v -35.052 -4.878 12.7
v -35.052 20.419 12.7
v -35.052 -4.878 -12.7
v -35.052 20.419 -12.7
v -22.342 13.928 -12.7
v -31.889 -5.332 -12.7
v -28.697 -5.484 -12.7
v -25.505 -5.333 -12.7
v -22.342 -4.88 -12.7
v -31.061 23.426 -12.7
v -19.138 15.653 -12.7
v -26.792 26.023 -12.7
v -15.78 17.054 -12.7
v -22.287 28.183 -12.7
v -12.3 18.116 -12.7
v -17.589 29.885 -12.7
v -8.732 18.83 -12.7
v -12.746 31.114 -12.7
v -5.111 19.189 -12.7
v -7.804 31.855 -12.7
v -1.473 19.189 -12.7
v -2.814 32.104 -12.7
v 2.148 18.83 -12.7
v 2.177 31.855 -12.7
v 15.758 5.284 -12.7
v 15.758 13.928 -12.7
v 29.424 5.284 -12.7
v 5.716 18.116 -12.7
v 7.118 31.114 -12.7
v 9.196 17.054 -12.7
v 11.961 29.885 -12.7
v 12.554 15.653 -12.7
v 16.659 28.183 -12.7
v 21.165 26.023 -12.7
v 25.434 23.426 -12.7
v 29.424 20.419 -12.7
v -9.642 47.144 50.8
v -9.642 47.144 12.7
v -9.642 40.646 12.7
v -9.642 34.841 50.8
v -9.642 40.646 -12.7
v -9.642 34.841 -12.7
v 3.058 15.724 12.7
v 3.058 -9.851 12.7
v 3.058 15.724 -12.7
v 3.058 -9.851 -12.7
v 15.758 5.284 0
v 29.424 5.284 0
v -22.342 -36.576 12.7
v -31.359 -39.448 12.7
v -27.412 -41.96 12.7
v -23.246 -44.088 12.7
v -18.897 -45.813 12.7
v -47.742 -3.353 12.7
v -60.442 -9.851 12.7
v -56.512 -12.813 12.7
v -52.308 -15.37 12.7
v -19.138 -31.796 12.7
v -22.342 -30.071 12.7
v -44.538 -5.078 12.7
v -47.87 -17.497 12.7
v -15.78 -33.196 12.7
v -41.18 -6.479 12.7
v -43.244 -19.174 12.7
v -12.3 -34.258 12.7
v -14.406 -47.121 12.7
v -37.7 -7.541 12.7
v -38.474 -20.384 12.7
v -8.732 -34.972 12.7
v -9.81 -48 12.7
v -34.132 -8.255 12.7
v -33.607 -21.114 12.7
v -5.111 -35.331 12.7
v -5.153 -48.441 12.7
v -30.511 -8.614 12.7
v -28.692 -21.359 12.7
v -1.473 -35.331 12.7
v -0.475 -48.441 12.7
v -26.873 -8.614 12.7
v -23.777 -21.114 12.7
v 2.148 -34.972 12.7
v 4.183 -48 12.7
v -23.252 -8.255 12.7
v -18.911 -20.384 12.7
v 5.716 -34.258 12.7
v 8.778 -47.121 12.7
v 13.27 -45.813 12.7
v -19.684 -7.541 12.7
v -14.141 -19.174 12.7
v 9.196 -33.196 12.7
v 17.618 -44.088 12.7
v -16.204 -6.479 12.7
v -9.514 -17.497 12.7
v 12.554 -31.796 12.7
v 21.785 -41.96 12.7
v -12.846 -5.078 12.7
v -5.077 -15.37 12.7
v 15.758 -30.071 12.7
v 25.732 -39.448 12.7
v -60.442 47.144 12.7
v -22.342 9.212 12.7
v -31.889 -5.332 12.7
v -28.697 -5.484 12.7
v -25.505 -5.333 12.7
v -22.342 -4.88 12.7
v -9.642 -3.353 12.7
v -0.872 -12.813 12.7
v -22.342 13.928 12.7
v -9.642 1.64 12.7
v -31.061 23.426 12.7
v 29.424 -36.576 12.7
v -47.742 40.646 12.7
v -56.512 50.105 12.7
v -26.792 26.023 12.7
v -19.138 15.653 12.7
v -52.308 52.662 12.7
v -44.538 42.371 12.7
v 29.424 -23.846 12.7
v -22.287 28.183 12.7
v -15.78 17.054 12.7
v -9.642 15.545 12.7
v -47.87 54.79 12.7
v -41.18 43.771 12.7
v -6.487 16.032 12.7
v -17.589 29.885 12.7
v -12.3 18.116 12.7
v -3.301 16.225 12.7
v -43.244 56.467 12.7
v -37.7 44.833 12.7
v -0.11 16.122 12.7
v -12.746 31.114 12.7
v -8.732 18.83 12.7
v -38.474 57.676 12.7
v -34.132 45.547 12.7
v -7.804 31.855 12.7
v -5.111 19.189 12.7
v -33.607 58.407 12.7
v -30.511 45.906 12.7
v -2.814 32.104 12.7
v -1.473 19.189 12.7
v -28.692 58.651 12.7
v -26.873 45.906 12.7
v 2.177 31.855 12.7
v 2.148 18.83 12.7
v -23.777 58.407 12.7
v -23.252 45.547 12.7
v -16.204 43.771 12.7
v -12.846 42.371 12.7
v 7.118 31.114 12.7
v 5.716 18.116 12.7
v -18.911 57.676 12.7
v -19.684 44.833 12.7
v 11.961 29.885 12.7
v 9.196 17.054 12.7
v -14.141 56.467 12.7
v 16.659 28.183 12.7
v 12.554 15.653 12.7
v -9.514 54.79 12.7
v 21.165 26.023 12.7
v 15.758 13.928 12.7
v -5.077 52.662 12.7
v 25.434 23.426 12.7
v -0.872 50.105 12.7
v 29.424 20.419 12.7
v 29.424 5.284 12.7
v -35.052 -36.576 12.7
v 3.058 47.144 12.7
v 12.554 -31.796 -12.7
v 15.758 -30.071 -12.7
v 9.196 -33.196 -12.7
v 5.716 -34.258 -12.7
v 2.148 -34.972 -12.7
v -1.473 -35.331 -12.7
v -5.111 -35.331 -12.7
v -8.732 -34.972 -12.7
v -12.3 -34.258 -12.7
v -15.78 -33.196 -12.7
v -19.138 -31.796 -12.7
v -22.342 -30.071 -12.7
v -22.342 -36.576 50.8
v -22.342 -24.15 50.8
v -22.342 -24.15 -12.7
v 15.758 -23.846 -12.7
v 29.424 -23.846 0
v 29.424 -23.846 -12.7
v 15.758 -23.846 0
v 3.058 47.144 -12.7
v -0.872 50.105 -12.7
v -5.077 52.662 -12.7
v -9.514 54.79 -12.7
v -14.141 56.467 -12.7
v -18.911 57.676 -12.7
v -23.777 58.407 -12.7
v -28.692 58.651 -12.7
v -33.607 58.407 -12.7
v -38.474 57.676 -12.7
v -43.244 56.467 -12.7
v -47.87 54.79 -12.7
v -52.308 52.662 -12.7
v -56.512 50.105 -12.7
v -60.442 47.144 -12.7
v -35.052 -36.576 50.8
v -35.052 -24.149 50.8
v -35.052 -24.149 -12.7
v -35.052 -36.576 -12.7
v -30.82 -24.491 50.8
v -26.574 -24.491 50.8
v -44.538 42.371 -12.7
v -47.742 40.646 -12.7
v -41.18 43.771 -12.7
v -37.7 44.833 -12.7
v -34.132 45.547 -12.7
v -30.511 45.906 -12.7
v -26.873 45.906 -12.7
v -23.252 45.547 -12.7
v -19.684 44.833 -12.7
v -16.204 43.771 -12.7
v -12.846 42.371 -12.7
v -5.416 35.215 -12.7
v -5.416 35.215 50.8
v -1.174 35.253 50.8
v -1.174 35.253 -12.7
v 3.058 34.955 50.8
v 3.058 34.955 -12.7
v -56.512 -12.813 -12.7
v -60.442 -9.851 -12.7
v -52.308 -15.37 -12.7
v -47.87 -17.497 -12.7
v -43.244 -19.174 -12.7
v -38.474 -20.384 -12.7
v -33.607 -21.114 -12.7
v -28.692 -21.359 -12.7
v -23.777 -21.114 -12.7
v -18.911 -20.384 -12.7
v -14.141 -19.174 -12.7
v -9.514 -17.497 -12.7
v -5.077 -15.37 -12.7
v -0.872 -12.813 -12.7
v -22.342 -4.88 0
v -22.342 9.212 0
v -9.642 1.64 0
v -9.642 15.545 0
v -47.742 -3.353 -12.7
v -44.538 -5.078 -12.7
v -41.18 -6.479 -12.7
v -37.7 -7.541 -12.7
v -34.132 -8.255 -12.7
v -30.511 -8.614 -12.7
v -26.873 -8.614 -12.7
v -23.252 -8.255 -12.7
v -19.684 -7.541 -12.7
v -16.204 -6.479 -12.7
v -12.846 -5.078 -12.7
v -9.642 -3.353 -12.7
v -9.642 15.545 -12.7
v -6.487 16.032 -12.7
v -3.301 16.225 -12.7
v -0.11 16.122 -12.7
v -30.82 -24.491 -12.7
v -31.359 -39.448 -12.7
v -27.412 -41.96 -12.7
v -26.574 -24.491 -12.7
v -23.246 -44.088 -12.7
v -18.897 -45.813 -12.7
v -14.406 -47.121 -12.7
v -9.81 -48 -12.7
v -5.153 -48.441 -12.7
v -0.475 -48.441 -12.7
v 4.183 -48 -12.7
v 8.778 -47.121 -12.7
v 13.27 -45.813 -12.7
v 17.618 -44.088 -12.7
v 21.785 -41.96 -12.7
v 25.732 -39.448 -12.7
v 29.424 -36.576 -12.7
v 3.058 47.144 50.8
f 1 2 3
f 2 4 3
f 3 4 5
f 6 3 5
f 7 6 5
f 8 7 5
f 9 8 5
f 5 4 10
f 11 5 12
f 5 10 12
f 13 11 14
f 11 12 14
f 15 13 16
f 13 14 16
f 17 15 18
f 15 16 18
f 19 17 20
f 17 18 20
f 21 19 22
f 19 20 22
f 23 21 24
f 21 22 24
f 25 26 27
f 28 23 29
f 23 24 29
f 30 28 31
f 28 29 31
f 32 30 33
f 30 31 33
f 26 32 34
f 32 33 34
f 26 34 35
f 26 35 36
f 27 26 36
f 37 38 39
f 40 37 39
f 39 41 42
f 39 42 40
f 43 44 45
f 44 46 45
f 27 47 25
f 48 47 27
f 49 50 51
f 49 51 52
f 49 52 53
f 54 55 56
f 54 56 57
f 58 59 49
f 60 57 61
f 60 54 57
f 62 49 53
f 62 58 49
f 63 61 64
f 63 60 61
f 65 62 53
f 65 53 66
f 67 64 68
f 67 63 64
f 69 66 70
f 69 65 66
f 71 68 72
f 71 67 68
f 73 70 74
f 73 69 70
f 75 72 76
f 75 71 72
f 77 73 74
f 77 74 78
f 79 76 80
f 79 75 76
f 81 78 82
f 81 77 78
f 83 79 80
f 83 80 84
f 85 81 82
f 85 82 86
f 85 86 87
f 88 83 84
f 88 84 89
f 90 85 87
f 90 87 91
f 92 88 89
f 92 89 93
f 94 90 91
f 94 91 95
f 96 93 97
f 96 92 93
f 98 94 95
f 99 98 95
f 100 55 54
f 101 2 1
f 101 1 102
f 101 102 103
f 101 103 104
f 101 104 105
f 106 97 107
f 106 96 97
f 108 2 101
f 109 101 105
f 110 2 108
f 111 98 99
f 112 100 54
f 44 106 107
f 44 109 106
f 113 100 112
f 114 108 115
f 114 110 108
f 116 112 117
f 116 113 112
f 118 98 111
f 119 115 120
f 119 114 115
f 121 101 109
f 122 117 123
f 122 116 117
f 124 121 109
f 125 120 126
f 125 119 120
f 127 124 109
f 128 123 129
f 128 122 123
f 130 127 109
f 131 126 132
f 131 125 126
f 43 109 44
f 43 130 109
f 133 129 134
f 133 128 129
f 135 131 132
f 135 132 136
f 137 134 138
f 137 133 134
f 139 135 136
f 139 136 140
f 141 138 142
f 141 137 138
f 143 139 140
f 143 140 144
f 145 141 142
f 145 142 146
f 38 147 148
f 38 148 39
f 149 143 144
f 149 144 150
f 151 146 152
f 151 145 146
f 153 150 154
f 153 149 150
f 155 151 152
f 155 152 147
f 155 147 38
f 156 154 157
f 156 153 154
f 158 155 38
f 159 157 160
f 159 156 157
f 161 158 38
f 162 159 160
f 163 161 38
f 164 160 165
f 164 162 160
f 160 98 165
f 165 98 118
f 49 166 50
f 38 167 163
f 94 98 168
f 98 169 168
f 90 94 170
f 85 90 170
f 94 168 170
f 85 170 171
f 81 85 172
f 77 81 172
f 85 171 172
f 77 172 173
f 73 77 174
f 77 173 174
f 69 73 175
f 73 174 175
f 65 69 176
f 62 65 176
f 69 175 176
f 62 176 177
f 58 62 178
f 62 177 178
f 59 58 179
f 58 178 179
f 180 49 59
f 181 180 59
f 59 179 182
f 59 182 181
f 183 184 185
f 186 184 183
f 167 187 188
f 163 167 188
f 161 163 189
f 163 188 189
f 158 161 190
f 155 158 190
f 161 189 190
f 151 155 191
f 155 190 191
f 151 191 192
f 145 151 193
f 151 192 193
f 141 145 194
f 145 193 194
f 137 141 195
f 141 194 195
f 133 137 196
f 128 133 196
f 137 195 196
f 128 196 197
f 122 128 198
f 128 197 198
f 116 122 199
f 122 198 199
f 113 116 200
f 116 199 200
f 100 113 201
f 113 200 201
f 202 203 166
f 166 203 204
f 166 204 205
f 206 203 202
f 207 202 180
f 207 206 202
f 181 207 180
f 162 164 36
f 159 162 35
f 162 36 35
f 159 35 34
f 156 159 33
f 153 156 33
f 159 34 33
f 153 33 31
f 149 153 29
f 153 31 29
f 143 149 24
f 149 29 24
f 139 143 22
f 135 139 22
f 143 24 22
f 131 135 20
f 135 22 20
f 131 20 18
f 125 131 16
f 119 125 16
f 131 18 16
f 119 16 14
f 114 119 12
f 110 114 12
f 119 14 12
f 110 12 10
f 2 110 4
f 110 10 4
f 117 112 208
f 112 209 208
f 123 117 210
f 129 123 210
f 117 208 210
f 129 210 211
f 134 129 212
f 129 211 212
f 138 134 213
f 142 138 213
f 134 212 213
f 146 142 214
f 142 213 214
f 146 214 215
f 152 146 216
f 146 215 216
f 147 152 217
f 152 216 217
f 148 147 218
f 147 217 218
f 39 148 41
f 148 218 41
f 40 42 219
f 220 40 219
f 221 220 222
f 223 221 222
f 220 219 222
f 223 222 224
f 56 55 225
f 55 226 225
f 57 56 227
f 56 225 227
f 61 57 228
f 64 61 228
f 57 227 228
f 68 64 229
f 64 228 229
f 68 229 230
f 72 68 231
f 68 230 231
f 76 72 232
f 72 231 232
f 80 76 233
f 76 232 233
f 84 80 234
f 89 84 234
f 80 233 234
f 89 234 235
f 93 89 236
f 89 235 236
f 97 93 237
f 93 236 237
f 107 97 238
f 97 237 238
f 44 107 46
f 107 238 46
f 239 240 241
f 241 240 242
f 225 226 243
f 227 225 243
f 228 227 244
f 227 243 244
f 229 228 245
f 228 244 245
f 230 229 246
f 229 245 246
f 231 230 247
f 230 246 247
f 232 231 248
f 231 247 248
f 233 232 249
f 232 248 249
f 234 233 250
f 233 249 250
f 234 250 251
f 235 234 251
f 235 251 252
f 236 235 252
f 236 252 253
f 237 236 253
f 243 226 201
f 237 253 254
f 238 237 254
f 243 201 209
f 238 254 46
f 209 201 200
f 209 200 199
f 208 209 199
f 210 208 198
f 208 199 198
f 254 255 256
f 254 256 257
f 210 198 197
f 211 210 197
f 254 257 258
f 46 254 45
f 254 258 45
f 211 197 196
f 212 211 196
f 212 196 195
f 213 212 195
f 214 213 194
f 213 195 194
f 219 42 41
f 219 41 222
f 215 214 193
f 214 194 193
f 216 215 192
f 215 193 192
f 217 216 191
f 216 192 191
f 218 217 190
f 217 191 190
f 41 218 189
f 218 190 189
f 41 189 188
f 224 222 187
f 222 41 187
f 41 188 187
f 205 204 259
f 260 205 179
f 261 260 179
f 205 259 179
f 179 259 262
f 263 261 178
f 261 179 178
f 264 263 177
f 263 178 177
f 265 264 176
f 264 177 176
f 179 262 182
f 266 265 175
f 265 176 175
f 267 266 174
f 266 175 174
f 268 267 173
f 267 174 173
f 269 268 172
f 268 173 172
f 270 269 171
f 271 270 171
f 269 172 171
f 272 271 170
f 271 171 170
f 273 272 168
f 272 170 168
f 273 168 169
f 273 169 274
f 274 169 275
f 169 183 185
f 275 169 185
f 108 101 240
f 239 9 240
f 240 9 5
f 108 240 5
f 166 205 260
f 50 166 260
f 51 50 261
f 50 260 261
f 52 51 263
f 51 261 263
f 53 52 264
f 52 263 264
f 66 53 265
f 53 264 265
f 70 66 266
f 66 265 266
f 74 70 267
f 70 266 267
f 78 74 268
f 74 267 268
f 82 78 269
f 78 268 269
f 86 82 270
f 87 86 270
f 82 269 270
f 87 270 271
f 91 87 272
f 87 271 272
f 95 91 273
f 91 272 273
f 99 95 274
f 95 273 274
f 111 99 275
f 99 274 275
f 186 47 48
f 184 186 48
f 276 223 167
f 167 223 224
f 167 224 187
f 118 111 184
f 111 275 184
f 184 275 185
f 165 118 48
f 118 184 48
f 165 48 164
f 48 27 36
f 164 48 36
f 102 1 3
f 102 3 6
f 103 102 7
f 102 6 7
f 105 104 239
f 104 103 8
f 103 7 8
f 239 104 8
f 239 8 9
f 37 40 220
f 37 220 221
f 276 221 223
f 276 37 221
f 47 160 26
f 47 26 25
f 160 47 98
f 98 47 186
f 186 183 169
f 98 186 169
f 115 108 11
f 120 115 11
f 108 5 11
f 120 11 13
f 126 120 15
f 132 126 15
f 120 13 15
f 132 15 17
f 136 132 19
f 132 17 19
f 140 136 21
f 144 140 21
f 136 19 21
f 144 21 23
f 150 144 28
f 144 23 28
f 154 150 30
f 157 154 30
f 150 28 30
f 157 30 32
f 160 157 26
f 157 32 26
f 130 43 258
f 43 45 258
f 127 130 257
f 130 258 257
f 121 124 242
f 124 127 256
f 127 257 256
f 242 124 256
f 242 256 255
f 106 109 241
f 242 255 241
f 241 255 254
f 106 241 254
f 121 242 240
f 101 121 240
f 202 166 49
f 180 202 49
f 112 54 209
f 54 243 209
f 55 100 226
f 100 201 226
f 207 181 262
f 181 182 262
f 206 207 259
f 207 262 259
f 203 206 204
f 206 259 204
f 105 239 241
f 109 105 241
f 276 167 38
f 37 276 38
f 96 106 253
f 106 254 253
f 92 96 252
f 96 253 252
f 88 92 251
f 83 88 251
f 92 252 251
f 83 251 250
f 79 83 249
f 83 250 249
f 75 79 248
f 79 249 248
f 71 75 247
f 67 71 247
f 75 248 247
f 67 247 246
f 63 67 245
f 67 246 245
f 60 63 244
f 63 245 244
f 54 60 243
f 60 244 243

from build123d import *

# Parameters (mm, degrees)
F1_DEPTH = 12.7
F2_DEPTH = 50.8
F0_W     = 13.666504261
F0_H     = 29.129663293
F3_DEPTH = 12.7


with BuildPart() as f1:
    # F0 (on Top) → F1 (new body)
    with BuildSketch(Plane.XY):
        with BuildLine():
            ThreePointArc((3.0578177724, 47.1438282191), (-28.6921822276, 58.6511969227), (-60.4421822276, 47.1438282191))
            Line((-60.4421822276, 47.1438282191), (-60.4421822276, -9.8514343737))
            ThreePointArc((-60.4421822276, -9.8514343737), (-28.6921822276, -21.3588030773), (3.0578177724, -9.8514343737))
            Line((3.0578177724, -9.8514343737), (3.0578177724, 15.7243934782))
            ThreePointArc((3.0578177724, 15.7243934782), (-3.3005283958, 16.2251409604), (-9.6421822276, 15.5448904828))
            Line((-9.6421822276, 15.5448904828), (-9.6421822276, 1.6402346703))
            Line((-9.6421822276, 1.6402346703), (-9.6421822276, -3.3534845781))
            ThreePointArc((-9.6421822276, -3.3534845781), (-28.6921822276, -8.6588030681), (-47.7421822276, -3.3534845781))
            Line((-47.7421822276, -3.3534845781), (-47.7421822276, 40.6458784342))
            ThreePointArc((-47.7421822276, 40.6458784342), (-28.6921822276, 45.9511969227), (-9.6421822276, 40.6458784342))
            Line((-9.6421822276, 40.6458784342), (-9.6421822276, 47.1438282191))
            Line((-9.6421822276, 47.1438282191), (3.0578177724, 47.1438282191))
        make_face()
        with BuildLine():
            Line((3.0578177724, 34.9553501383), (3.0578177724, 47.1438282191))
            Line((3.0578177724, 47.1438282191), (-9.6421822276, 47.1438282191))
            Line((-9.6421822276, 47.1438282191), (-9.6421822276, 40.6458784342))
            Line((-9.6421822276, 40.6458784342), (-9.6421822276, 34.8409533928))
            ThreePointArc((-9.6421822276, 34.8409533928), (-3.2955894398, 35.2764107322), (3.0578177724, 34.9553501383))
        make_face()
    extrude(amount=-F1_DEPTH)

    # F0 (on Top) → F2 (join)
    with BuildSketch(Plane.XY):
        with BuildLine():
            Line((3.0578177724, 34.9553501383), (3.0578177724, 47.1438282191))
            Line((3.0578177724, 47.1438282191), (-9.6421822276, 47.1438282191))
            Line((-9.6421822276, 47.1438282191), (-9.6421822276, 40.6458784342))
            Line((-9.6421822276, 40.6458784342), (-9.6421822276, 34.8409533928))
            ThreePointArc((-9.6421822276, 34.8409533928), (-3.2955894398, 35.2764107322), (3.0578177724, 34.9553501383))
        make_face()
    extrude(amount=F2_DEPTH)



with BuildPart() as f1b:
    # F0 (on Top) → F1, piece 2 (new body)
    with BuildSketch(Plane.XY):
        with BuildLine():
            Line((-22.3420616333, -4.8797410205), (-22.3420616333, 9.2116537254))
            Line((-22.3420616333, 9.2116537254), (-22.3420616333, 13.9284846169))
            ThreePointArc((-22.3420616333, 13.9284846169), (-3.2920616333, 19.2338031054), (15.7579383667, 13.9284846169))
            Line((15.7579383667, 13.9284846169), (15.7579383667, 5.2839141095))
            Line((15.7579383667, 5.2839141095), (29.4244426276, 5.2839141095))
            Line((29.4244426276, 5.2839141095), (29.4244426276, 20.4192625928))
            ThreePointArc((29.4244426276, 20.4192625928), (-2.8137786862, 32.1035806717), (-35.052, 20.4192625928))
            Line((-35.052, 20.4192625928), (-35.052, -4.8778777905))
            ThreePointArc((-35.052, -4.8778777905), (-28.6971195064, -5.4838027062), (-22.3420616333, -4.8797410205))
        make_face()
    extrude(amount=-F1_DEPTH)


with BuildPart() as f1c:
    # F0 (on Top) → F1, piece 3 (new body)
    with BuildSketch(Plane.XY):
        with BuildLine():
            Line((29.4244426276, -23.8457491835), (15.7579383667, -23.8457491835))
            Line((15.7579383667, -23.8457491835), (15.7579383667, -30.0708783954))
            ThreePointArc((15.7579383667, -30.0708783954), (-3.2920616333, -35.3761968854), (-22.3420616333, -30.0708783954))
            Line((-22.3420616333, -30.0708783954), (-22.3420616333, -36.576))
            Line((-22.3420616333, -36.576), (-35.052, -36.576))
            ThreePointArc((-35.052, -36.576), (-2.8137786862, -48.4961576662), (29.4244426276, -36.576))
            Line((29.4244426276, -36.576), (29.4244426276, -23.8457491835))
        make_face()
        with BuildLine():
            Line((-22.3420616333, -36.576), (-22.3420616333, -30.0708783954))
            Line((-22.3420616333, -30.0708783954), (-22.3420616333, -24.150039099))
            ThreePointArc((-22.3420616333, -24.150039099), (-28.6970664182, -24.5338028511), (-35.052, -24.1488618101))
            Line((-35.052, -24.1488618101), (-35.052, -24.150039099))
            Line((-35.052, -24.150039099), (-35.052, -36.576))
            Line((-35.052, -36.576), (-22.3420616333, -36.576))
        make_face()
    extrude(amount=-F1_DEPTH)

    # F0 (on Top) → F2, piece 2 (join)
    with BuildSketch(Plane.XY):
        with BuildLine():
            Line((-22.3420616333, -36.576), (-22.3420616333, -30.0708783954))
            Line((-22.3420616333, -30.0708783954), (-22.3420616333, -24.150039099))
            ThreePointArc((-22.3420616333, -24.150039099), (-28.6970664182, -24.5338028511), (-35.052, -24.1488618101))
            Line((-35.052, -24.1488618101), (-35.052, -24.150039099))
            Line((-35.052, -24.150039099), (-35.052, -36.576))
            Line((-35.052, -36.576), (-22.3420616333, -36.576))
        make_face()
    extrude(amount=F2_DEPTH)


with BuildPart() as f1_1:
    add(f1.part)

    add(f1b.part)  # F3 merges F1b

    add(f1c.part)  # F3 merges F1c
    # F0 (on Top) → F3 (join)
    with BuildSketch(Plane.XY):
        with BuildLine():
            ThreePointArc((3.0578177724, 47.1438282191), (-28.6921822276, 58.6511969227), (-60.4421822276, 47.1438282191))
            Line((-60.4421822276, 47.1438282191), (-60.4421822276, -9.8514343737))
            ThreePointArc((-60.4421822276, -9.8514343737), (-28.6921822276, -21.3588030773), (3.0578177724, -9.8514343737))
            Line((3.0578177724, -9.8514343737), (3.0578177724, 15.7243934782))
            ThreePointArc((3.0578177724, 15.7243934782), (-3.3005283958, 16.2251409604), (-9.6421822276, 15.5448904828))
            Line((-9.6421822276, 15.5448904828), (-9.6421822276, 1.6402346703))
            Line((-9.6421822276, 1.6402346703), (-9.6421822276, -3.3534845781))
            ThreePointArc((-9.6421822276, -3.3534845781), (-28.6921822276, -8.6588030681), (-47.7421822276, -3.3534845781))
            Line((-47.7421822276, -3.3534845781), (-47.7421822276, 40.6458784342))
            ThreePointArc((-47.7421822276, 40.6458784342), (-28.6921822276, 45.9511969227), (-9.6421822276, 40.6458784342))
            Line((-9.6421822276, 40.6458784342), (-9.6421822276, 47.1438282191))
            Line((-9.6421822276, 47.1438282191), (3.0578177724, 47.1438282191))
        make_face()
        with BuildLine():
            Line((-22.3420616333, -4.8797410205), (-22.3420616333, 9.2116537254))
            Line((-22.3420616333, 9.2116537254), (-22.3420616333, 13.9284846169))
            ThreePointArc((-22.3420616333, 13.9284846169), (-3.2920616333, 19.2338031054), (15.7579383667, 13.9284846169))
            Line((15.7579383667, 13.9284846169), (15.7579383667, 5.2839141095))
            Line((15.7579383667, 5.2839141095), (29.4244426276, 5.2839141095))
            Line((29.4244426276, 5.2839141095), (29.4244426276, 20.4192625928))
            ThreePointArc((29.4244426276, 20.4192625928), (-2.8137786862, 32.1035806717), (-35.052, 20.4192625928))
            Line((-35.052, 20.4192625928), (-35.052, -4.8778777905))
            ThreePointArc((-35.052, -4.8778777905), (-28.6971195064, -5.4838027062), (-22.3420616333, -4.8797410205))
        make_face()
        Polygon((-9.6421822276, 1.6402346703), (-9.6421822276, 15.5448904828), (-22.3420616333, 9.2116537254), (-22.3420616333, -4.8797410205), align=None)
        with Locations((22.5911904972, -9.280917537)):
            Rectangle(F0_W, F0_H)
        with BuildLine():
            Line((29.4244426276, -23.8457491835), (15.7579383667, -23.8457491835))
            Line((15.7579383667, -23.8457491835), (15.7579383667, -30.0708783954))
            ThreePointArc((15.7579383667, -30.0708783954), (-3.2920616333, -35.3761968854), (-22.3420616333, -30.0708783954))
            Line((-22.3420616333, -30.0708783954), (-22.3420616333, -36.576))
            Line((-22.3420616333, -36.576), (-35.052, -36.576))
            ThreePointArc((-35.052, -36.576), (-2.8137786862, -48.4961576662), (29.4244426276, -36.576))
            Line((29.4244426276, -36.576), (29.4244426276, -23.8457491835))
        make_face()
    extrude(amount=F3_DEPTH)


solid = f1_1.part
